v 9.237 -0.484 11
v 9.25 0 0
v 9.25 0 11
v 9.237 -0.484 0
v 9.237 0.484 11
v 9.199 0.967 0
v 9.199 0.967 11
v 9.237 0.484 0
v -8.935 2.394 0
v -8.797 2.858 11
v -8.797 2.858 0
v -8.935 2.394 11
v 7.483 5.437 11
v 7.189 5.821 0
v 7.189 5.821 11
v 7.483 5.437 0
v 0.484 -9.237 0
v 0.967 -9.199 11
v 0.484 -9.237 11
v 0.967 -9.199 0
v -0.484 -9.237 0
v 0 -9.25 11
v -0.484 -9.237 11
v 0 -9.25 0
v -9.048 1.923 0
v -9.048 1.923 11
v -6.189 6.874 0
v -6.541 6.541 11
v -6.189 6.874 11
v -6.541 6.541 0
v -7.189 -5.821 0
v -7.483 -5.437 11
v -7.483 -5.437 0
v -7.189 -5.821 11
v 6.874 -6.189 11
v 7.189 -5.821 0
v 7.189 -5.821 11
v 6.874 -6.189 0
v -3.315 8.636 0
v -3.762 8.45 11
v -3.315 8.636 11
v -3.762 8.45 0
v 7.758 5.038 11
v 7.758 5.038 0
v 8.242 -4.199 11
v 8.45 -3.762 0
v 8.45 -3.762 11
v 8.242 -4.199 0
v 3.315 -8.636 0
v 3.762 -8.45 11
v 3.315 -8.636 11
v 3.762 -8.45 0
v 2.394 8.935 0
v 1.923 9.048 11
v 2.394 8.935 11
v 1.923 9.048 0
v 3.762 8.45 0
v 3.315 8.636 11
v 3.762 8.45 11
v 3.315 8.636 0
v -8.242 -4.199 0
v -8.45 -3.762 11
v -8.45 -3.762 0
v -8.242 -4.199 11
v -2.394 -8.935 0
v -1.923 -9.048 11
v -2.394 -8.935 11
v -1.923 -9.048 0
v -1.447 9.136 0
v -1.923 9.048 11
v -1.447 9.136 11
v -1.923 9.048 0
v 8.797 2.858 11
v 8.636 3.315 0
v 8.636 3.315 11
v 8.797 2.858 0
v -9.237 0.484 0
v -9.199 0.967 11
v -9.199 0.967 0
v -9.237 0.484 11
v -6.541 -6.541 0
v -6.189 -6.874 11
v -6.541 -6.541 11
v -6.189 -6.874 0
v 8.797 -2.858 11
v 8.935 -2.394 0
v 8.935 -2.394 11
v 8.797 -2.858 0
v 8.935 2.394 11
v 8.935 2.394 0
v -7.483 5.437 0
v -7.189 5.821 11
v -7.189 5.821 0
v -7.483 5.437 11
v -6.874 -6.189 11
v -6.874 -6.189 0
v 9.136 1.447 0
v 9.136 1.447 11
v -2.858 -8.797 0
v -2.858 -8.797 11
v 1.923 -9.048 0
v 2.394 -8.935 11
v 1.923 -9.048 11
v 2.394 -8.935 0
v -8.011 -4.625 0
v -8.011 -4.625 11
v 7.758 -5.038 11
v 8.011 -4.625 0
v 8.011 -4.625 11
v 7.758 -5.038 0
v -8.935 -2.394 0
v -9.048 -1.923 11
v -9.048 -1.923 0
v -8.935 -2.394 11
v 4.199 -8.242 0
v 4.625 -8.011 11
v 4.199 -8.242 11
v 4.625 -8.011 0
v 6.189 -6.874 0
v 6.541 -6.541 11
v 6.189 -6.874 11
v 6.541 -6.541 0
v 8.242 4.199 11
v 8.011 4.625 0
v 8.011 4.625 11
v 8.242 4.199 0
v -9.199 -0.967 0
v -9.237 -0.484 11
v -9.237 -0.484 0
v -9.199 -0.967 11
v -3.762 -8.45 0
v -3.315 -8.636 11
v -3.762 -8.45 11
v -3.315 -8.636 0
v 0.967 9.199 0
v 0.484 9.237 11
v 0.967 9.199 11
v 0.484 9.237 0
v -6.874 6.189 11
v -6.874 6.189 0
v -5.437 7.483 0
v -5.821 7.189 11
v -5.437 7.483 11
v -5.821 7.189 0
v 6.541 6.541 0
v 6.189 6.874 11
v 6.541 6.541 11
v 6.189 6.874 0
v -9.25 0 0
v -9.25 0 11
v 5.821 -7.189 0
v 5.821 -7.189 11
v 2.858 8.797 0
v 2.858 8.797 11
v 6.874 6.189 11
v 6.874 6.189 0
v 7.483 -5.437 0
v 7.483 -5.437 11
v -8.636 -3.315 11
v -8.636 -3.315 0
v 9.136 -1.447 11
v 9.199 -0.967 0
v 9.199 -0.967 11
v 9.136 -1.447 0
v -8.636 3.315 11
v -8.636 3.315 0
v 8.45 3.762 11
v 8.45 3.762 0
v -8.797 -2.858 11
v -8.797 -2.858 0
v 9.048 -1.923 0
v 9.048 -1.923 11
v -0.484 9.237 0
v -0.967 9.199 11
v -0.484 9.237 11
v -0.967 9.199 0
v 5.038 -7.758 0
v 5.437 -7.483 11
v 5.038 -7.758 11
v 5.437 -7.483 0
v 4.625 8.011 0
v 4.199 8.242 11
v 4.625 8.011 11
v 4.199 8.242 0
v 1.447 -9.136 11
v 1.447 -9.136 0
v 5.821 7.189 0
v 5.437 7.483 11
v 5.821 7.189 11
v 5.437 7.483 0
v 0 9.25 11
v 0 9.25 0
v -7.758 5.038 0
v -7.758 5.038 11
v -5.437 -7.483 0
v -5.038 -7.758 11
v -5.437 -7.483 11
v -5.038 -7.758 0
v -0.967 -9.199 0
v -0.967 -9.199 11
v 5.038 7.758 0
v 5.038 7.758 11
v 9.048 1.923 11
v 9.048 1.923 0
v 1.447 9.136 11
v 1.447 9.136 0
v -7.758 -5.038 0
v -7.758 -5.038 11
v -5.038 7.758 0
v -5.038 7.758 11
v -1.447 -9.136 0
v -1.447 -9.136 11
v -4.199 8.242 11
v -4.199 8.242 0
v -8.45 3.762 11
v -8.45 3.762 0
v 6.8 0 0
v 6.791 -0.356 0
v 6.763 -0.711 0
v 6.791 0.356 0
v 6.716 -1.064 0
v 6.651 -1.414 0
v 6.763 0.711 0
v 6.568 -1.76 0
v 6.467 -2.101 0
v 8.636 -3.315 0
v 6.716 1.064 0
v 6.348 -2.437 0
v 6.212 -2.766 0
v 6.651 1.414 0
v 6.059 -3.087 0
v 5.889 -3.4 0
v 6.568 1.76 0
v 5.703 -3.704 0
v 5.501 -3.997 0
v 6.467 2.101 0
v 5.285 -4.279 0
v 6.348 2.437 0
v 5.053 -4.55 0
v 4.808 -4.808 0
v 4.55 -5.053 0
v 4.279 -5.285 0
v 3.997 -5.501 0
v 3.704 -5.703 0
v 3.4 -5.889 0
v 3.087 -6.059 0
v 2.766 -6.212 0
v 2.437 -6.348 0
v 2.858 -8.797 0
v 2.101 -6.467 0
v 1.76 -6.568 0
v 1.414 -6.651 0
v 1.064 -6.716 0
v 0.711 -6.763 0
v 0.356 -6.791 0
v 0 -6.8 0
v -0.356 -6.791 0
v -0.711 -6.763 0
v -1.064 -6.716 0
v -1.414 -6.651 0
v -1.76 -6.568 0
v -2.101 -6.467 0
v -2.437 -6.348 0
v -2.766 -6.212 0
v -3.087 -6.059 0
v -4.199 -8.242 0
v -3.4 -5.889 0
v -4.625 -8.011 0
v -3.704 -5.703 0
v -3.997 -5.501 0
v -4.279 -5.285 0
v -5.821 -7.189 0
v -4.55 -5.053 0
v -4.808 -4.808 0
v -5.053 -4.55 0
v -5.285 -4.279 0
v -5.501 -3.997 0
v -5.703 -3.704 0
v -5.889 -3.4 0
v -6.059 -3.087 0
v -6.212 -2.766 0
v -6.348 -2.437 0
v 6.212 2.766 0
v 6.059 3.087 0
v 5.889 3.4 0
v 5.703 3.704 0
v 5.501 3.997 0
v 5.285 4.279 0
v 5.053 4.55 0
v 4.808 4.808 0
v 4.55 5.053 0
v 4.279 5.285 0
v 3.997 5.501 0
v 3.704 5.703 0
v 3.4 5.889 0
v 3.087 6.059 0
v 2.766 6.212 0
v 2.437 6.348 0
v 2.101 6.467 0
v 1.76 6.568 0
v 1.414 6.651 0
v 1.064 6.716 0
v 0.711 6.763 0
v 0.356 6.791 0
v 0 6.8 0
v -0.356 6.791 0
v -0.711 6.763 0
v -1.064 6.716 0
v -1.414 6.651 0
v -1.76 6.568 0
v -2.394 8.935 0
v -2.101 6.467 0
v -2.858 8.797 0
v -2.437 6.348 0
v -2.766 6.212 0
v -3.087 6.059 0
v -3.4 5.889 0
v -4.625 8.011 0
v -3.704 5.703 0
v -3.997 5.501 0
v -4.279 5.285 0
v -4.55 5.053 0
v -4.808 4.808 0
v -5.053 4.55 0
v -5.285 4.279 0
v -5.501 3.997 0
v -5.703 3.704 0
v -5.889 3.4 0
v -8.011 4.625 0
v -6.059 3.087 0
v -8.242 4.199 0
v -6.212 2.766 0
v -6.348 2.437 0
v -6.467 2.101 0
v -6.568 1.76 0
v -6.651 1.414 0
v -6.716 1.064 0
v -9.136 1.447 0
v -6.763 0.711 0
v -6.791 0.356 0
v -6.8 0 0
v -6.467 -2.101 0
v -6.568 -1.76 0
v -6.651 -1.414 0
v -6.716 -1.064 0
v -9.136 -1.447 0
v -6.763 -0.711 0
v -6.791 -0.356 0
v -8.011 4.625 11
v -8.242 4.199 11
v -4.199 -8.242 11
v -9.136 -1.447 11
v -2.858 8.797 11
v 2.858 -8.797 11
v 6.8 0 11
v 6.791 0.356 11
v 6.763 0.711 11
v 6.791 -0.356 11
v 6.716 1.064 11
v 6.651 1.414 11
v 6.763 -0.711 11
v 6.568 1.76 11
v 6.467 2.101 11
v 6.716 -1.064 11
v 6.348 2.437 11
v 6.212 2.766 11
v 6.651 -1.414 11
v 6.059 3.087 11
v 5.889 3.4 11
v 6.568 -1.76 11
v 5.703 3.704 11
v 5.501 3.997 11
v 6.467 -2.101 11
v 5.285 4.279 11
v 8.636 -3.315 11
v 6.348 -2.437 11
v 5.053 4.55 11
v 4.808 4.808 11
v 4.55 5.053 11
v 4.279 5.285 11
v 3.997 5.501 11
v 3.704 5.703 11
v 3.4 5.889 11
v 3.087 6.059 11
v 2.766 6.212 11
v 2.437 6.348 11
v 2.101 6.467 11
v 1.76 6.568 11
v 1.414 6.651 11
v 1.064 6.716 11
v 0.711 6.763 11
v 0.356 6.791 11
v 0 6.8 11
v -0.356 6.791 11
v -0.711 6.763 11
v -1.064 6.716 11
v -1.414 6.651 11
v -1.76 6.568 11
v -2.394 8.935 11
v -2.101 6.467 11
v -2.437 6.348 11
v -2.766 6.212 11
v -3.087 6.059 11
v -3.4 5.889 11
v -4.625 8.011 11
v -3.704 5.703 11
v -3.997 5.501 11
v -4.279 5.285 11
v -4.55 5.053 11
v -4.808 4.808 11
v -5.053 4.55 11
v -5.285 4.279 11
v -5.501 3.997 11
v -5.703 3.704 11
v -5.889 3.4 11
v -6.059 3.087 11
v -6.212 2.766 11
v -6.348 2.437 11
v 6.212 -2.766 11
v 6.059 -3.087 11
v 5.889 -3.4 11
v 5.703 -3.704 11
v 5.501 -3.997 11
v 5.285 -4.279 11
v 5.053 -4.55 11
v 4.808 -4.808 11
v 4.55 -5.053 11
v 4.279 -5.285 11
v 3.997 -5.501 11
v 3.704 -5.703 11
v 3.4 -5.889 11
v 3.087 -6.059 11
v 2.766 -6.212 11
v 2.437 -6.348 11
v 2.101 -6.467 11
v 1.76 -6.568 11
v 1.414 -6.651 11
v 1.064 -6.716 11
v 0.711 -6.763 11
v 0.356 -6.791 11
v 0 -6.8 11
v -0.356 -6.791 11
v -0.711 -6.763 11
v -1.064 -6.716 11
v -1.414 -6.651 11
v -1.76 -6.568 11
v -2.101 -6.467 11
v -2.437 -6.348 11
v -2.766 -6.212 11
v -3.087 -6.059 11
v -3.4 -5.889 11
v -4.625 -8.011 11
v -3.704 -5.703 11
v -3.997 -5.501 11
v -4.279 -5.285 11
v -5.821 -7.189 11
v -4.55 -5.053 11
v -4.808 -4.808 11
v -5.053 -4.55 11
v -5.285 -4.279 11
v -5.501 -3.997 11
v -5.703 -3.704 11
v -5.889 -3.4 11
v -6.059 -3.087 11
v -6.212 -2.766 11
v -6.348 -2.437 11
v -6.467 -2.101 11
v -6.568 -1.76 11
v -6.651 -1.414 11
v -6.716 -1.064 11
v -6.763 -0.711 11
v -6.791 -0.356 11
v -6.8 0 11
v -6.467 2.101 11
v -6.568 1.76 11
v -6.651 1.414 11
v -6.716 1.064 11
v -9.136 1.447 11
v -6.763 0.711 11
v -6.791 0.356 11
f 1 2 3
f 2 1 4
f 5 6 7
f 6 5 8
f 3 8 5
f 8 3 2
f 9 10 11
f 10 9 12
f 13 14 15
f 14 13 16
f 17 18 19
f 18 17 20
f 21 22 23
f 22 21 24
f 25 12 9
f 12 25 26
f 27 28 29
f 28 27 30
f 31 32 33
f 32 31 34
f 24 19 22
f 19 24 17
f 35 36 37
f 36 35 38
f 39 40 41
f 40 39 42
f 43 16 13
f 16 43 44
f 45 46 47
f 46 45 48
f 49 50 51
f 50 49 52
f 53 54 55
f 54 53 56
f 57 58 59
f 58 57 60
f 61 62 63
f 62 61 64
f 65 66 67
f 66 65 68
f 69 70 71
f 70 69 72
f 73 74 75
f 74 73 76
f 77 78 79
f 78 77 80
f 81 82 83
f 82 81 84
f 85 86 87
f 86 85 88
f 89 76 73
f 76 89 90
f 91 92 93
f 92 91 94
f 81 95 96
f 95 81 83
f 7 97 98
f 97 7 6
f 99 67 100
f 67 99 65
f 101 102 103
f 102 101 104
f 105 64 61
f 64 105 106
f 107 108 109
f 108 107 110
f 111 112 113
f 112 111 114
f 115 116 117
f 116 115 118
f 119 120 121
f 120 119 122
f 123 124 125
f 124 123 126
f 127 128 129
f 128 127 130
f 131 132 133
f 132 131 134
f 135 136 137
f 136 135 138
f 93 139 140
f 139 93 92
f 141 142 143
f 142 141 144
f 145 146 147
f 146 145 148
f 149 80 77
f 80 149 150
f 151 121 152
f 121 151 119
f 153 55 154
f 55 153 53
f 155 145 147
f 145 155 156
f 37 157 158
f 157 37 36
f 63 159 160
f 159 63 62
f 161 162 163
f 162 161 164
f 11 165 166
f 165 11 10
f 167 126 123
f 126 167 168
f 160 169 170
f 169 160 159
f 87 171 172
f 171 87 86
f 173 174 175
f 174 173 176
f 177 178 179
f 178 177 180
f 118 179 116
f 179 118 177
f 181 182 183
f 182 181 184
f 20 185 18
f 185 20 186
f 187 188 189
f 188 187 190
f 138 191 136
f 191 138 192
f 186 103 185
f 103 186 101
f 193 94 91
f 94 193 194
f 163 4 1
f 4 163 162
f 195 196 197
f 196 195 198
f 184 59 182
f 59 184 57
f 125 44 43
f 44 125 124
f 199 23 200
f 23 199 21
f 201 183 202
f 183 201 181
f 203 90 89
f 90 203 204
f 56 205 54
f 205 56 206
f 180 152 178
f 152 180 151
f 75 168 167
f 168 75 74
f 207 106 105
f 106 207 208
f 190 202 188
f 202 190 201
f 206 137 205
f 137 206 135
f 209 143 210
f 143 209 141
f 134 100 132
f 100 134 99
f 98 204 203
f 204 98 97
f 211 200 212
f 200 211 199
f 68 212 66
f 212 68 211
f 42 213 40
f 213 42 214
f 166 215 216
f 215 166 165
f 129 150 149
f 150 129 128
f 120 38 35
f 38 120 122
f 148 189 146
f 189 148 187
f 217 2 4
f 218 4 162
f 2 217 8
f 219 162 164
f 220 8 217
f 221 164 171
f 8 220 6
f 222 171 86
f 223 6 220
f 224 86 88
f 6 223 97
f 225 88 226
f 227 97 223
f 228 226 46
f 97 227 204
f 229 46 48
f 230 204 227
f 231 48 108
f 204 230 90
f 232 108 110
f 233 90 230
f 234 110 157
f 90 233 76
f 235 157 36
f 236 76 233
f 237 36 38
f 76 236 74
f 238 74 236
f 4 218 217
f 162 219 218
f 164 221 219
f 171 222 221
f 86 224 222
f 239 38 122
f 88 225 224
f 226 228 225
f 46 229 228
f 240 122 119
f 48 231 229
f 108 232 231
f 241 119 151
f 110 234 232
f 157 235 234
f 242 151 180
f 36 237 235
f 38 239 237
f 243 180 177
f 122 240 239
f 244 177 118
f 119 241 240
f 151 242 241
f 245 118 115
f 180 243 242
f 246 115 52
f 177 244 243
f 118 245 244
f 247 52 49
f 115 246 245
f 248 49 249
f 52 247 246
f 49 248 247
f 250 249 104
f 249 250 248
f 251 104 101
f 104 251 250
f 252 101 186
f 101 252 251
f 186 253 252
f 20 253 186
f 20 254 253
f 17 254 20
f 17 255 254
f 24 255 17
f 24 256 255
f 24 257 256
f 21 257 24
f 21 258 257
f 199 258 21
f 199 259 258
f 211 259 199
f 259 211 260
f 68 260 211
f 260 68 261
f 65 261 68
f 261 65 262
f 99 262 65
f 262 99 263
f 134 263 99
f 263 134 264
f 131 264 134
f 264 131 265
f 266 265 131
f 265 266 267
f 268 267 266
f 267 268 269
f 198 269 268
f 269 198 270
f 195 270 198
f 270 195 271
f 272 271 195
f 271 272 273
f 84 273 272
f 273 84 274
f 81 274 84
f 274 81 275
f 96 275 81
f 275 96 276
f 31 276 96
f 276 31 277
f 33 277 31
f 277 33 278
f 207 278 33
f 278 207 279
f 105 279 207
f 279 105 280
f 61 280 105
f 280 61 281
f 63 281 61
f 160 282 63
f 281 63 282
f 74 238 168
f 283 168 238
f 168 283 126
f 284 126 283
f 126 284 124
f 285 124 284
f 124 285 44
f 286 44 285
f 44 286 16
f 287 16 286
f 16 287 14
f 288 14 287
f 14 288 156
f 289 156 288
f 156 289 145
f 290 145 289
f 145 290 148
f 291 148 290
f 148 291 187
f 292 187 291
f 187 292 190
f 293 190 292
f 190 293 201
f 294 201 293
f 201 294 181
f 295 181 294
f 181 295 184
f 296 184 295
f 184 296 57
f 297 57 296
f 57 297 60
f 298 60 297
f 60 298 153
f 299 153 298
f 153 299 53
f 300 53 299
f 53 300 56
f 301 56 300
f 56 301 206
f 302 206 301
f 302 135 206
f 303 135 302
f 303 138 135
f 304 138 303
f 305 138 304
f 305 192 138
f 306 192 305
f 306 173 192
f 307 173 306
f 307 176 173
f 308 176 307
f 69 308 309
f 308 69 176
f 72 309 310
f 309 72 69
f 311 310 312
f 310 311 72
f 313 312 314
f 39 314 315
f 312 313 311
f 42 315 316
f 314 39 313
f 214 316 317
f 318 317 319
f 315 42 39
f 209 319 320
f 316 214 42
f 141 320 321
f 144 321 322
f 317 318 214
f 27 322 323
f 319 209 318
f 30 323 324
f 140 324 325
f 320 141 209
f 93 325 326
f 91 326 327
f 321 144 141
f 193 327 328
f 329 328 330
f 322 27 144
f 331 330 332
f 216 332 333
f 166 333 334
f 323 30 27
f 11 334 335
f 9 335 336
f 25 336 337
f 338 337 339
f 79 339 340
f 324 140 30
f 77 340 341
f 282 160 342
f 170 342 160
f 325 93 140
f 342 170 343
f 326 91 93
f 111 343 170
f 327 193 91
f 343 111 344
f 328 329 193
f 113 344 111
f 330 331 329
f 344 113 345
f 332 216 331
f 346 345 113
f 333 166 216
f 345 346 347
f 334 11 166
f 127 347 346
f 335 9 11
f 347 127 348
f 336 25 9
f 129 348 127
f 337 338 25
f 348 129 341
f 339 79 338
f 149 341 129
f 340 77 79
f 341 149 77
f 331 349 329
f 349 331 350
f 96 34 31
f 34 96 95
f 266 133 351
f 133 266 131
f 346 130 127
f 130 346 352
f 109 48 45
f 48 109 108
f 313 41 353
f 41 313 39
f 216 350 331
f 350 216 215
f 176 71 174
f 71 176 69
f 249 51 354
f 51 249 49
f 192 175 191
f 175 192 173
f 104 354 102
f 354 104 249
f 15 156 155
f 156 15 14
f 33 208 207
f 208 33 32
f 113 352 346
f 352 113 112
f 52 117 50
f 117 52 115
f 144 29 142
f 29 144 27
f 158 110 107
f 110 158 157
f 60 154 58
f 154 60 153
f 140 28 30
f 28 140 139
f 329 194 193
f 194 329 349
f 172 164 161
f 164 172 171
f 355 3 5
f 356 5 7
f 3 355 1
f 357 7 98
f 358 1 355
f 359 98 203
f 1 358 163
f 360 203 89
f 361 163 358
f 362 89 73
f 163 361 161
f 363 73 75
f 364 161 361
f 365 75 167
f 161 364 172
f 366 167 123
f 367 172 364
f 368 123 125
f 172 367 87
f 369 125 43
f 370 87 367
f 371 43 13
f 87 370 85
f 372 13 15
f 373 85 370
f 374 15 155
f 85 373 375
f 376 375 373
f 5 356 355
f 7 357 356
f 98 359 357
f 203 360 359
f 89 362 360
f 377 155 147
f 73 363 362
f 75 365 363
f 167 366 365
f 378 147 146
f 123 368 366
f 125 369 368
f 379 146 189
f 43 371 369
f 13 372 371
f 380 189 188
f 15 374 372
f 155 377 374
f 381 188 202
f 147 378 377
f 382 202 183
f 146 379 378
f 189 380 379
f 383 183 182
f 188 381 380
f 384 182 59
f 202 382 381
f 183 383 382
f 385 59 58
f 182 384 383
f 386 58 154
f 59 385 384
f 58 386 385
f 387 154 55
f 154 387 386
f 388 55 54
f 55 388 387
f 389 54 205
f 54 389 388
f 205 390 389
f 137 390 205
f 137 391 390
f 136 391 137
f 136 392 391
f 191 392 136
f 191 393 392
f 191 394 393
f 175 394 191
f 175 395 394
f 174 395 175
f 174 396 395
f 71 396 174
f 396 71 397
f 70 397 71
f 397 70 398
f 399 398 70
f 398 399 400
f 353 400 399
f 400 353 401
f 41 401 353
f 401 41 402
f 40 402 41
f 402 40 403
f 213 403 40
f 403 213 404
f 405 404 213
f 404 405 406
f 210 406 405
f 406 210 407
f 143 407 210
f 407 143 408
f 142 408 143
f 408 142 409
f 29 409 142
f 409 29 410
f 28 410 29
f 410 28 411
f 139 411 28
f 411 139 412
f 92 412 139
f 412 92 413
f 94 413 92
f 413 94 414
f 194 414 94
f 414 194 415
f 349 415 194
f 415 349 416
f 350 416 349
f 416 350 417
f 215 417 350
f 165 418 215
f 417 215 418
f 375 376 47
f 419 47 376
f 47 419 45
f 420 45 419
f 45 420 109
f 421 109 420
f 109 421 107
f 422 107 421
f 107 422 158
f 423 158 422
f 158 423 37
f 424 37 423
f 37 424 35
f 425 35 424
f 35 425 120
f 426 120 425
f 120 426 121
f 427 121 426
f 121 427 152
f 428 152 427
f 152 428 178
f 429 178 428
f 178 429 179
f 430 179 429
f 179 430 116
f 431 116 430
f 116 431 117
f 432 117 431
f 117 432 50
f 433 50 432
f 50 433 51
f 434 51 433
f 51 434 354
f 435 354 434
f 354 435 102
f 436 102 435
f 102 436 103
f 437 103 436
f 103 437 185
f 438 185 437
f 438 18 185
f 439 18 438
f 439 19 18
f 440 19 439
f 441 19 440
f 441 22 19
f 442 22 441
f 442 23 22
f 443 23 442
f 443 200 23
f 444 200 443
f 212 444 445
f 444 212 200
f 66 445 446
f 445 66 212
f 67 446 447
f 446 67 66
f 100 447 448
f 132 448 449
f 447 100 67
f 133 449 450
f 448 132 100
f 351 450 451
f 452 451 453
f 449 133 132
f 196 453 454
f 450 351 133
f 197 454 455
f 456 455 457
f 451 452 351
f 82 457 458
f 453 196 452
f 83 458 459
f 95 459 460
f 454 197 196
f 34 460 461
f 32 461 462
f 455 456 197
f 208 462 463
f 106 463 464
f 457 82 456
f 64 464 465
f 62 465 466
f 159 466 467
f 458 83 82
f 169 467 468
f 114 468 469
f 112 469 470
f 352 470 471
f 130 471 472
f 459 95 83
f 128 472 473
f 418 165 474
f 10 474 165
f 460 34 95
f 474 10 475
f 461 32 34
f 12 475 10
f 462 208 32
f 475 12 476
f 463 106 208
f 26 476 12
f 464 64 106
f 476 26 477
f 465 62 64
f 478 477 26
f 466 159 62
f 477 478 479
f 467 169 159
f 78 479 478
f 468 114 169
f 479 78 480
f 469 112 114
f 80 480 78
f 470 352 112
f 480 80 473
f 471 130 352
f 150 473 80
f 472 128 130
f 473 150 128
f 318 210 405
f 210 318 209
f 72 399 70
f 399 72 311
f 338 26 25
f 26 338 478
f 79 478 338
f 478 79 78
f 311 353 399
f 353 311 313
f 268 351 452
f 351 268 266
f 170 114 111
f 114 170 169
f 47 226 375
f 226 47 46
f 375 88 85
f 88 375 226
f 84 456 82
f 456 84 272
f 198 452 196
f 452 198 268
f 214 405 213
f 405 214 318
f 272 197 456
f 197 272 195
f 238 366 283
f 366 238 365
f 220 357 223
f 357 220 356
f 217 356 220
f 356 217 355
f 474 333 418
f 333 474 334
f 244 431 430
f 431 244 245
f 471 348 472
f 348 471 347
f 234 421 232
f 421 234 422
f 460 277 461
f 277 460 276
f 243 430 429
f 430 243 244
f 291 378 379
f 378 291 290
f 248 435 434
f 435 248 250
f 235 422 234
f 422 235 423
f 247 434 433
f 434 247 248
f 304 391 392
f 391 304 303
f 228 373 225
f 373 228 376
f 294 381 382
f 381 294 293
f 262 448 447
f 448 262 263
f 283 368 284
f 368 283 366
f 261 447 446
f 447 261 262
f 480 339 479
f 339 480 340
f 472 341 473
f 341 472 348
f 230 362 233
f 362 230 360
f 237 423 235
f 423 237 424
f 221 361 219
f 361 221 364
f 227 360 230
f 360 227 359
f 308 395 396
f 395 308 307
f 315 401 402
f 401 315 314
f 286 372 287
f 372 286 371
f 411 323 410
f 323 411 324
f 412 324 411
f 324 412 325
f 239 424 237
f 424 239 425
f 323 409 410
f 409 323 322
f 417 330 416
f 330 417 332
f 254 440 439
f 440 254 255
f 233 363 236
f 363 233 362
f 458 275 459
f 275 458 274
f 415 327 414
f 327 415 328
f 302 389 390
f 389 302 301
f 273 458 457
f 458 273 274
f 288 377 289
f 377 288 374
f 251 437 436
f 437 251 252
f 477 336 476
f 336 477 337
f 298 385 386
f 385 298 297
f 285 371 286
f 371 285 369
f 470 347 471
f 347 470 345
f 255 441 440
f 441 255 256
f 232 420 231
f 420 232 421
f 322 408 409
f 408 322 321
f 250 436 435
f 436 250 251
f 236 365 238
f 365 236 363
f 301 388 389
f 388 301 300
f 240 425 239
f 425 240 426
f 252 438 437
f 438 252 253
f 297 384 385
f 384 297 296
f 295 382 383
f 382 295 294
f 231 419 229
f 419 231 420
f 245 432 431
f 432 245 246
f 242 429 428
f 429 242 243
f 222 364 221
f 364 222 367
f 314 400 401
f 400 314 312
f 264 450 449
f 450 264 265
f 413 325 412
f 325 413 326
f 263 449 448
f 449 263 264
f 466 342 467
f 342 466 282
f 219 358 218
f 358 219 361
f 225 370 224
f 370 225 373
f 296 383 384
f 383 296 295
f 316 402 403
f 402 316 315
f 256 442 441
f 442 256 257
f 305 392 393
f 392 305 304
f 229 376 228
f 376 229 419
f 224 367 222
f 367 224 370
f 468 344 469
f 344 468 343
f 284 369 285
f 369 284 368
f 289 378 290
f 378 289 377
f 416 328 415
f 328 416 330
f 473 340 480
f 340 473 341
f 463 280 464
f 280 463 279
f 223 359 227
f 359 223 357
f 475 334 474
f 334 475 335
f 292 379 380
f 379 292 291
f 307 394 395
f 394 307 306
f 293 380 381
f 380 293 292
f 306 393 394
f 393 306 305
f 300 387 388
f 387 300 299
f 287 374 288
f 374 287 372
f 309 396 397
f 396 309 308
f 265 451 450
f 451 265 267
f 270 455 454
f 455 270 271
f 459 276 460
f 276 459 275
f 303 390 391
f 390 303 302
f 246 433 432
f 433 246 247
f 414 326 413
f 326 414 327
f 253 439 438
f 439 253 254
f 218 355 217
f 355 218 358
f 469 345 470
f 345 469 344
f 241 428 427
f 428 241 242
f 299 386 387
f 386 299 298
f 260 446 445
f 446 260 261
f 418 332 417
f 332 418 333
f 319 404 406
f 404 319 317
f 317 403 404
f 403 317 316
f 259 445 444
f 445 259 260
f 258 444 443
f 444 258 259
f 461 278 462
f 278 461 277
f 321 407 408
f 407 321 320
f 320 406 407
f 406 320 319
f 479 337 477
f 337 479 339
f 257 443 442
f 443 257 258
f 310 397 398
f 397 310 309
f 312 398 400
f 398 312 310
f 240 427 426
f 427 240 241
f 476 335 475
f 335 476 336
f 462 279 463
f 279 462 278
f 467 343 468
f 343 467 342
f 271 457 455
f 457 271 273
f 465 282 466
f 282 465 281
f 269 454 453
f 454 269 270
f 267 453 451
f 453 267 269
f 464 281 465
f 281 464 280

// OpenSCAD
// ============================================================
//  Axle spacer for the PowerSmart printed drive wheel
//  Stack: housing -> spacer -> bearing tube -> nylock
//  11 mm = stud smooth section 40 minus bearing tube 29
//  OD stays under 19 so it only touches the bearing INNER race.
//  Print 100 percent infill, it is clamped hardware.
// ============================================================

thickness = 11;     // stud smooth length minus bearing tube length
stud_d    = 13.6;   // clearance over the 13 mm stud
od        = 18.5;   // inner race contact only, under 19

$fn = 120;
difference() {
    cylinder(h = thickness, d = od);
    translate([0,0,-0.01]) cylinder(h = thickness + 0.02, d = stud_d);
}
